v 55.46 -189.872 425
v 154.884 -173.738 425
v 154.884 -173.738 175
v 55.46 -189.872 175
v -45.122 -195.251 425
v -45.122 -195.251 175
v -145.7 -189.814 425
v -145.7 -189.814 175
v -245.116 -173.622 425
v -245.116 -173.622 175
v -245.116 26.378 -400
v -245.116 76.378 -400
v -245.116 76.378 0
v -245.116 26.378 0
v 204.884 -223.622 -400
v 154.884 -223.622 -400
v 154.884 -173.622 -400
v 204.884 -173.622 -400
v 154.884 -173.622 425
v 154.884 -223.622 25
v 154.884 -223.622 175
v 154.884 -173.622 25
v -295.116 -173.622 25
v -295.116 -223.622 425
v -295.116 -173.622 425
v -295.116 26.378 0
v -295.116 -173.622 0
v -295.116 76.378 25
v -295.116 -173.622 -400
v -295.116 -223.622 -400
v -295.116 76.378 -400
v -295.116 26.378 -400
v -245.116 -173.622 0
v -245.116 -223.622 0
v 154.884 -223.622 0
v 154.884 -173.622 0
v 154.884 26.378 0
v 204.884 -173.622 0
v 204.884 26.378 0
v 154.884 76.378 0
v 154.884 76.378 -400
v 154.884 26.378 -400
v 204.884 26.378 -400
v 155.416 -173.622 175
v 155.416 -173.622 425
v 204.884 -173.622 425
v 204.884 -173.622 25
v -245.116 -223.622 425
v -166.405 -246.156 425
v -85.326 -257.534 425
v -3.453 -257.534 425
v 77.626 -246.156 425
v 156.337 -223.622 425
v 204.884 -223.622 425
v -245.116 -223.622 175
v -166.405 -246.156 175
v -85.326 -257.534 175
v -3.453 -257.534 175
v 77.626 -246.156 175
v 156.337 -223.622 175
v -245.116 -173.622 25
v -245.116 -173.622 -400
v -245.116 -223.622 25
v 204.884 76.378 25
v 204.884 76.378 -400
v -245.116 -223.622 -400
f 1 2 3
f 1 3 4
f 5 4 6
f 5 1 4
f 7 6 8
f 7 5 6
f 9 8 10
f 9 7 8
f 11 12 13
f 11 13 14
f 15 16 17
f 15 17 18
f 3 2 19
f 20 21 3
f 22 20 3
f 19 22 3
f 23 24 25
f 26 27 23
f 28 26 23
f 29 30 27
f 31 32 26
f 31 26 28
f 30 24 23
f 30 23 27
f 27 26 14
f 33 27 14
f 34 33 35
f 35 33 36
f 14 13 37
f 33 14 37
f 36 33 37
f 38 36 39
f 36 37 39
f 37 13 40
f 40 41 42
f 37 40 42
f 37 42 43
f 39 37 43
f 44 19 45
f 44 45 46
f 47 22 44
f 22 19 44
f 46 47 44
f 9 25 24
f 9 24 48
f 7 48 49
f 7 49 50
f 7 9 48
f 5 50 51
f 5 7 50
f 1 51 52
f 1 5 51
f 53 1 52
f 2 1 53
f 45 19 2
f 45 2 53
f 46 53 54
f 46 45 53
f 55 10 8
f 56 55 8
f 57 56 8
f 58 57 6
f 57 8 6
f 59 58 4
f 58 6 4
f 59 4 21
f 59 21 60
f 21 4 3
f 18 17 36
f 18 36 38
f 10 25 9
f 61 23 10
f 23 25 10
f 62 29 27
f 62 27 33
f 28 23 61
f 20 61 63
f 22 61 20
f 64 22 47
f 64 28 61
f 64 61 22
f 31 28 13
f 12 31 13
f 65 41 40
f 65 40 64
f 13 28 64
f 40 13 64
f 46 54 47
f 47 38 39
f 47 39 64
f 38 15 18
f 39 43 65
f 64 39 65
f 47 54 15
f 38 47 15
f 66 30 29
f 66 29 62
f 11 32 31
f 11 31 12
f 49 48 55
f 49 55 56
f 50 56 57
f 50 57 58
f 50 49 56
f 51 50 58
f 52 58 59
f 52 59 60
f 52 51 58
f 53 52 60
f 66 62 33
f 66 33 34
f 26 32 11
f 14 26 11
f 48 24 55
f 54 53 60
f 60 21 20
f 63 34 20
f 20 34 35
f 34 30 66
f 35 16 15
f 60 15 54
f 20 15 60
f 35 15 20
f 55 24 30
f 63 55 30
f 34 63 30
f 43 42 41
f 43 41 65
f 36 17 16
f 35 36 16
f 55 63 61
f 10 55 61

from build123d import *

# Parameters (mm, degrees)
F0_W     = 500
F0_H     = 300
F1_DEPTH = 25
F2_W     = 50
F2_H     = 50
F3_DEPTH = 400
F4_W     = 50
F4_H     = 50
F5_DEPTH = 400
F7_DEPTH = 250


with BuildPart() as f1:
    # F0 (on Top) → F1 (new body)
    with BuildSketch(Plane.XY):
        with Locations((-45.115738, -73.622181)):
            Rectangle(F0_W, F0_H)
    extrude(amount=F1_DEPTH)

    # F2 (on face) → F3 (join)
    with BuildSketch(Plane(origin=(0, 0, 0), x_dir=(1, 0, 0), z_dir=(0, 0, -1))):
        with Locations((179.884262, -51.377819)):
            Rectangle(F2_W, F2_H)
        with Locations((179.884262, 198.622181)):
            Rectangle(F2_W, F2_H)
        with Locations((-270.115738, -51.377819)):
            Rectangle(F2_W, F2_H)
        with Locations((-270.115738, 198.622181)):
            Rectangle(F2_W, F2_H)
    extrude(amount=F3_DEPTH)

    # F4 (on face) → F5 (join)
    with BuildSketch(Plane.XY.offset(25)):
        with Locations((179.884262, -198.622181)):
            Rectangle(F4_W, F4_H)
        with Locations((-270.115738, -198.622181)):
            Rectangle(F4_W, F4_H)
    extrude(amount=F5_DEPTH)

    # F6 (on face) → F7 (join)
    with BuildSketch(Plane.XY.offset(425)):
        with BuildLine():
            Line((-245.115738, -173.622181), (-245.115738, -223.622181))
            ThreePointArc((-245.115738, -223.622181), (-44.389514, -258.960982), (156.33671, -223.622181))
            Line((156.33671, -223.622181), (155.415639, -173.622181))
            ThreePointArc((155.415639, -173.622181), (-44.850049, -195.2512), (-245.115738, -173.622181))
        make_face()
    extrude(amount=-F7_DEPTH)


solid = f1.part
